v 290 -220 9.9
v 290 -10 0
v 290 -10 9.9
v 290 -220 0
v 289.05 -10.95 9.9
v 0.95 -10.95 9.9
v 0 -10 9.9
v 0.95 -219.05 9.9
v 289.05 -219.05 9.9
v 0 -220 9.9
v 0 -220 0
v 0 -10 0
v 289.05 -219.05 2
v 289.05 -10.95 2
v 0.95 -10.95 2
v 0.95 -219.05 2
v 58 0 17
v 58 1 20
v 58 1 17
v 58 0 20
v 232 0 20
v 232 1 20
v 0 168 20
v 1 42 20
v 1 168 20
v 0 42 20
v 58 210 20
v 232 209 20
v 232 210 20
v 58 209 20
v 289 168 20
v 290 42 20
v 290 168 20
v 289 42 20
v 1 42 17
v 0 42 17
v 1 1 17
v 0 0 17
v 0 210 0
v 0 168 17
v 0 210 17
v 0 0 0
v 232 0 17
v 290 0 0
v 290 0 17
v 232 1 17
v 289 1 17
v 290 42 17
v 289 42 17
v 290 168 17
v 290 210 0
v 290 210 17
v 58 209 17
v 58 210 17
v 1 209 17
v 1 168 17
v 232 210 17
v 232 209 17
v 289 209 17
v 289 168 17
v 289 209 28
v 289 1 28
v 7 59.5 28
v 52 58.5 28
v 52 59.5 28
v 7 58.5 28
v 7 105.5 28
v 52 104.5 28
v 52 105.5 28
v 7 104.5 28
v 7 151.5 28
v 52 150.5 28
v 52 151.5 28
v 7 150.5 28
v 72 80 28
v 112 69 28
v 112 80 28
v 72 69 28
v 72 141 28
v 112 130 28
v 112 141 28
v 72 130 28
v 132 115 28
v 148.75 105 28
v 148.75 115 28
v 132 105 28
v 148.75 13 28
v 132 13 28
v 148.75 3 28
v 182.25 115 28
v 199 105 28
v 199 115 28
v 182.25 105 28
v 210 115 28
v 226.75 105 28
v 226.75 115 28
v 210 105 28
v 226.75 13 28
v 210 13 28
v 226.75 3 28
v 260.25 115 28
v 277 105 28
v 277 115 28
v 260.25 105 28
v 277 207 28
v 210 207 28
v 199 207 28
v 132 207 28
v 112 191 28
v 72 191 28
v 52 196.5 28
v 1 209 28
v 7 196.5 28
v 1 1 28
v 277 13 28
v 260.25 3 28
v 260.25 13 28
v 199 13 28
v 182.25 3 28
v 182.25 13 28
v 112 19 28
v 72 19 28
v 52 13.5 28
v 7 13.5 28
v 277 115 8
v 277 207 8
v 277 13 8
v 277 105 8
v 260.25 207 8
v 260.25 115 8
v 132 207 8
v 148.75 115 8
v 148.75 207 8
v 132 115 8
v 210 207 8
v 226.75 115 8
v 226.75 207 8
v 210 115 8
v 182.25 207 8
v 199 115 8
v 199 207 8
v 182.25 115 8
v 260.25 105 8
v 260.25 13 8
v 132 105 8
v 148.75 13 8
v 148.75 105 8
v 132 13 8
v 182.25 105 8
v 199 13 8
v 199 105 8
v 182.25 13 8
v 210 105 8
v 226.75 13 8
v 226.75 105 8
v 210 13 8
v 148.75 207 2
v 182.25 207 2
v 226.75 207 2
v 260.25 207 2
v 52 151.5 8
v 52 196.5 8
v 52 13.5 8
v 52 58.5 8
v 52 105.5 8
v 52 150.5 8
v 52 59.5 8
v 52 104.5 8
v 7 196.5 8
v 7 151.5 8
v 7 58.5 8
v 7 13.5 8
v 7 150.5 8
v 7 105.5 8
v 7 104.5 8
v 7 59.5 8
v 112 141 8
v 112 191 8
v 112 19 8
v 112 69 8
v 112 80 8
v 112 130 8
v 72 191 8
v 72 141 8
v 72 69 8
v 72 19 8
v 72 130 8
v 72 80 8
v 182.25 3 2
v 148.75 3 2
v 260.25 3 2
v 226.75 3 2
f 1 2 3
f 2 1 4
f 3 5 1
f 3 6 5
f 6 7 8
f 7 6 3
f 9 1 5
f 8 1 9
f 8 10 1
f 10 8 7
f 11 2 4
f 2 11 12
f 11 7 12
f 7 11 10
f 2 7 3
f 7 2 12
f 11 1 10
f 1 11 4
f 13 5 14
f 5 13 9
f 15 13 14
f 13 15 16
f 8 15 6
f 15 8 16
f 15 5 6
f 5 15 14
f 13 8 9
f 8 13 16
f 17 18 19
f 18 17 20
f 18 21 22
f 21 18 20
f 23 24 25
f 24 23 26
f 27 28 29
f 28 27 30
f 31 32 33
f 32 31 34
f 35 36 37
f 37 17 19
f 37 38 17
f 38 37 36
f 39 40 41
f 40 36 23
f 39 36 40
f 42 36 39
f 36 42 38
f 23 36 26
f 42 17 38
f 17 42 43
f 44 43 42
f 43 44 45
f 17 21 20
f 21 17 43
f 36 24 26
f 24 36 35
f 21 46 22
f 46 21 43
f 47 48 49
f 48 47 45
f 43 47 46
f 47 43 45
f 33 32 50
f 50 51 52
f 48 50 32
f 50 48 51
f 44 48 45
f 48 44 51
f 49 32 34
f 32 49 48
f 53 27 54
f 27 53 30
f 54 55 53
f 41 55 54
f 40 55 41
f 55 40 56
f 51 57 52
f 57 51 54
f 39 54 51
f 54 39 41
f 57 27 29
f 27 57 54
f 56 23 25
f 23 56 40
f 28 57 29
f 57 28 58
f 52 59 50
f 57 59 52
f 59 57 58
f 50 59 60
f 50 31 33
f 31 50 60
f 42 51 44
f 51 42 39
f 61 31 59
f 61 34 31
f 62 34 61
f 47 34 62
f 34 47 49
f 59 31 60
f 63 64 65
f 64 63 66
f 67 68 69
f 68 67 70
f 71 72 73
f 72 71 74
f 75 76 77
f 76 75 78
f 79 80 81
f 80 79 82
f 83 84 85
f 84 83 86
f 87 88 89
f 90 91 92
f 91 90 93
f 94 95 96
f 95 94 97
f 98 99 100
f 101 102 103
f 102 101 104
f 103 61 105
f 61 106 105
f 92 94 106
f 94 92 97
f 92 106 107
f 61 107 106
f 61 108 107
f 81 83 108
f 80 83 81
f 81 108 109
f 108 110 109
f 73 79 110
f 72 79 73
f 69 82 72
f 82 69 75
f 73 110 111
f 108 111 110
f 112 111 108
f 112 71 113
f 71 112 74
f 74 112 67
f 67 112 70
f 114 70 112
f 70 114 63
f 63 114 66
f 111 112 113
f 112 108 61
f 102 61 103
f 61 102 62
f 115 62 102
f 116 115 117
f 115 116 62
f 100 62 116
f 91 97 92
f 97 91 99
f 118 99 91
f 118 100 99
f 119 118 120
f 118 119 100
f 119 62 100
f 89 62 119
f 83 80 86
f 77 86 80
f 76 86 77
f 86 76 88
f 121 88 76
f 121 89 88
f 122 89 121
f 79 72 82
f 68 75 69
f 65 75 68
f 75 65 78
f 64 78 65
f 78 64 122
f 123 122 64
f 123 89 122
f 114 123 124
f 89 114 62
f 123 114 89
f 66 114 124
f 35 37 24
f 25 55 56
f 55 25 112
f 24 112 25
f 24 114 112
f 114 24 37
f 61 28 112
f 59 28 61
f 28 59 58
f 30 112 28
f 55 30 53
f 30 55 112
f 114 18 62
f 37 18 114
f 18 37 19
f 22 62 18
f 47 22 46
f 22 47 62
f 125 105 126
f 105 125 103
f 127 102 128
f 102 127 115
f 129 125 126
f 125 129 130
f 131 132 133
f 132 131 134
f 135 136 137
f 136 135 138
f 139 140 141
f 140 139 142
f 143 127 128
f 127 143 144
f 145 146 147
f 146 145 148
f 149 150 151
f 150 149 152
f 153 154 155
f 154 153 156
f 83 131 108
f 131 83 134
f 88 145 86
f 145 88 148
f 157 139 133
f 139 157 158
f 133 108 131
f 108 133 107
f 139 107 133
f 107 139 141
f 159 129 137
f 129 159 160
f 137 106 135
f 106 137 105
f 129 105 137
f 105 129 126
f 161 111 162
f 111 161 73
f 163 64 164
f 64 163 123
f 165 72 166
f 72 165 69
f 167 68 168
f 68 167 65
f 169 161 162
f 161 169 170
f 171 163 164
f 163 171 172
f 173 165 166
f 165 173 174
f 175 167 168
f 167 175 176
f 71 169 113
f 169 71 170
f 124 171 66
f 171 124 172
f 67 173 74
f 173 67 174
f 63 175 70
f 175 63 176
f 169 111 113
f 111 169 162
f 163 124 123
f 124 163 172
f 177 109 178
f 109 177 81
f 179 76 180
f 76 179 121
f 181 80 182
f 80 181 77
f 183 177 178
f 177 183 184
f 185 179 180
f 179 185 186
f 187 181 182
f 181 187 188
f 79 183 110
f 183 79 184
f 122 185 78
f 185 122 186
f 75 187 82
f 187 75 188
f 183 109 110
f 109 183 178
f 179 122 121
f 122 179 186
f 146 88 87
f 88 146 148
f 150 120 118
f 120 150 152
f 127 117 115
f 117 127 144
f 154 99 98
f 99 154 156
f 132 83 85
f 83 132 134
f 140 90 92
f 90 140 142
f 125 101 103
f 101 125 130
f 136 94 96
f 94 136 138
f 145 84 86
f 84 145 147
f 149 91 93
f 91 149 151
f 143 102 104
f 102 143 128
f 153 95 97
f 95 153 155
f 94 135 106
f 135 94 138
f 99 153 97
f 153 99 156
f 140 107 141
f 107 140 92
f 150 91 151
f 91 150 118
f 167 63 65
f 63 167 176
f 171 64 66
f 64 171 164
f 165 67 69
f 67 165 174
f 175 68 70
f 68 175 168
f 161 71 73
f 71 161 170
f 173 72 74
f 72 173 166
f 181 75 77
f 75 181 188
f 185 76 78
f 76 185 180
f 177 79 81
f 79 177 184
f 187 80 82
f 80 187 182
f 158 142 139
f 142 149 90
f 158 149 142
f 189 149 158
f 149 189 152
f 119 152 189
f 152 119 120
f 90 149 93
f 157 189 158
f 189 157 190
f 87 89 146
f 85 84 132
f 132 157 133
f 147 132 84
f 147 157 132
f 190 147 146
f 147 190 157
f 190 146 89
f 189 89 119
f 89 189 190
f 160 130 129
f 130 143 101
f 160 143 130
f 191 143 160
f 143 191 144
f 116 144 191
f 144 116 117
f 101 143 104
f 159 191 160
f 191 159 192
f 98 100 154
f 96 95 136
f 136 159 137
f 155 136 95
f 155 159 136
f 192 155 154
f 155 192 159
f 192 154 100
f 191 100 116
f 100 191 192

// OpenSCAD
include <boardgame_insert_toolkit_lib.scad>;


// This is a working example of the Boardgame Insert Toolkit used to create a single large box insert
// for the Z-Man game, Pandemic. It is designed for a printer that can print 290mm x 210mm x 28mm.
// See the two box version for an example of a design for smaller printers.
// 
data =
[
    [   "29cm box", // for large printers
        [
            [   "box_dimensions",                 [290.0, 210.0, 28.0] ],                       // float f -- default:[ 100, 100, 100]
            [ "enabled",                                    true ],

            [   "components",
                [
                    [   "cards",
                        [
                            ["type",                        "cards"],                   // "cards" | "chits" | "generic" -- default: "generic"
                            ["compartment_size",            [ 67.0, 92.0, 20.0] ],      // float f -- default:[ 10, 10, 10]
                            ["num_compartments",            [2, 2] ],                   // int i -- default: [1, 1]
                            ["position",                    [130, "center" ] ],          // float f | "center" | "max" -- default: "center"
                            ["extra_spacing",               [10.0, 0.0] ],                   // float f
                            ["enabled",                     true ],                     // true | false
                            ["rotation",                    0 ],                        // 0 | 1 | -1

                        ]
                    ],

                    [   "disease markers",
                        [
                            ["enabled",                     true ],                     // true | false
                            ["type",                        "chits"],
                            ["compartment_size",            [ 45.0, 45.0, 20.0] ],
                            ["num_compartments",            [1, 4] ],
                            ["position",                    [5, "center" ] ],
                        ]
                    ],

                    [   "other bits",
                        [
                            ["enabled",                     true ],                     // true | false
                            ["type",                        "chits"],
                            ["compartment_size",            [ 40.0, 50.0, 20.0] ],
                            ["num_compartments",            [1, 3] ],
                            ["position",                    [70, "center" ] ],
                            ["extra_spacing",               [0, 10] ]
                        ]
                    ]
                    
                    // more components here...
                ]
            ],
        ]
    ]
];


// for printing control.
b_print_lid = true;
b_print_box = true;

b_print_box = "29cm box"; // isolate one box to print

MakeAll();
